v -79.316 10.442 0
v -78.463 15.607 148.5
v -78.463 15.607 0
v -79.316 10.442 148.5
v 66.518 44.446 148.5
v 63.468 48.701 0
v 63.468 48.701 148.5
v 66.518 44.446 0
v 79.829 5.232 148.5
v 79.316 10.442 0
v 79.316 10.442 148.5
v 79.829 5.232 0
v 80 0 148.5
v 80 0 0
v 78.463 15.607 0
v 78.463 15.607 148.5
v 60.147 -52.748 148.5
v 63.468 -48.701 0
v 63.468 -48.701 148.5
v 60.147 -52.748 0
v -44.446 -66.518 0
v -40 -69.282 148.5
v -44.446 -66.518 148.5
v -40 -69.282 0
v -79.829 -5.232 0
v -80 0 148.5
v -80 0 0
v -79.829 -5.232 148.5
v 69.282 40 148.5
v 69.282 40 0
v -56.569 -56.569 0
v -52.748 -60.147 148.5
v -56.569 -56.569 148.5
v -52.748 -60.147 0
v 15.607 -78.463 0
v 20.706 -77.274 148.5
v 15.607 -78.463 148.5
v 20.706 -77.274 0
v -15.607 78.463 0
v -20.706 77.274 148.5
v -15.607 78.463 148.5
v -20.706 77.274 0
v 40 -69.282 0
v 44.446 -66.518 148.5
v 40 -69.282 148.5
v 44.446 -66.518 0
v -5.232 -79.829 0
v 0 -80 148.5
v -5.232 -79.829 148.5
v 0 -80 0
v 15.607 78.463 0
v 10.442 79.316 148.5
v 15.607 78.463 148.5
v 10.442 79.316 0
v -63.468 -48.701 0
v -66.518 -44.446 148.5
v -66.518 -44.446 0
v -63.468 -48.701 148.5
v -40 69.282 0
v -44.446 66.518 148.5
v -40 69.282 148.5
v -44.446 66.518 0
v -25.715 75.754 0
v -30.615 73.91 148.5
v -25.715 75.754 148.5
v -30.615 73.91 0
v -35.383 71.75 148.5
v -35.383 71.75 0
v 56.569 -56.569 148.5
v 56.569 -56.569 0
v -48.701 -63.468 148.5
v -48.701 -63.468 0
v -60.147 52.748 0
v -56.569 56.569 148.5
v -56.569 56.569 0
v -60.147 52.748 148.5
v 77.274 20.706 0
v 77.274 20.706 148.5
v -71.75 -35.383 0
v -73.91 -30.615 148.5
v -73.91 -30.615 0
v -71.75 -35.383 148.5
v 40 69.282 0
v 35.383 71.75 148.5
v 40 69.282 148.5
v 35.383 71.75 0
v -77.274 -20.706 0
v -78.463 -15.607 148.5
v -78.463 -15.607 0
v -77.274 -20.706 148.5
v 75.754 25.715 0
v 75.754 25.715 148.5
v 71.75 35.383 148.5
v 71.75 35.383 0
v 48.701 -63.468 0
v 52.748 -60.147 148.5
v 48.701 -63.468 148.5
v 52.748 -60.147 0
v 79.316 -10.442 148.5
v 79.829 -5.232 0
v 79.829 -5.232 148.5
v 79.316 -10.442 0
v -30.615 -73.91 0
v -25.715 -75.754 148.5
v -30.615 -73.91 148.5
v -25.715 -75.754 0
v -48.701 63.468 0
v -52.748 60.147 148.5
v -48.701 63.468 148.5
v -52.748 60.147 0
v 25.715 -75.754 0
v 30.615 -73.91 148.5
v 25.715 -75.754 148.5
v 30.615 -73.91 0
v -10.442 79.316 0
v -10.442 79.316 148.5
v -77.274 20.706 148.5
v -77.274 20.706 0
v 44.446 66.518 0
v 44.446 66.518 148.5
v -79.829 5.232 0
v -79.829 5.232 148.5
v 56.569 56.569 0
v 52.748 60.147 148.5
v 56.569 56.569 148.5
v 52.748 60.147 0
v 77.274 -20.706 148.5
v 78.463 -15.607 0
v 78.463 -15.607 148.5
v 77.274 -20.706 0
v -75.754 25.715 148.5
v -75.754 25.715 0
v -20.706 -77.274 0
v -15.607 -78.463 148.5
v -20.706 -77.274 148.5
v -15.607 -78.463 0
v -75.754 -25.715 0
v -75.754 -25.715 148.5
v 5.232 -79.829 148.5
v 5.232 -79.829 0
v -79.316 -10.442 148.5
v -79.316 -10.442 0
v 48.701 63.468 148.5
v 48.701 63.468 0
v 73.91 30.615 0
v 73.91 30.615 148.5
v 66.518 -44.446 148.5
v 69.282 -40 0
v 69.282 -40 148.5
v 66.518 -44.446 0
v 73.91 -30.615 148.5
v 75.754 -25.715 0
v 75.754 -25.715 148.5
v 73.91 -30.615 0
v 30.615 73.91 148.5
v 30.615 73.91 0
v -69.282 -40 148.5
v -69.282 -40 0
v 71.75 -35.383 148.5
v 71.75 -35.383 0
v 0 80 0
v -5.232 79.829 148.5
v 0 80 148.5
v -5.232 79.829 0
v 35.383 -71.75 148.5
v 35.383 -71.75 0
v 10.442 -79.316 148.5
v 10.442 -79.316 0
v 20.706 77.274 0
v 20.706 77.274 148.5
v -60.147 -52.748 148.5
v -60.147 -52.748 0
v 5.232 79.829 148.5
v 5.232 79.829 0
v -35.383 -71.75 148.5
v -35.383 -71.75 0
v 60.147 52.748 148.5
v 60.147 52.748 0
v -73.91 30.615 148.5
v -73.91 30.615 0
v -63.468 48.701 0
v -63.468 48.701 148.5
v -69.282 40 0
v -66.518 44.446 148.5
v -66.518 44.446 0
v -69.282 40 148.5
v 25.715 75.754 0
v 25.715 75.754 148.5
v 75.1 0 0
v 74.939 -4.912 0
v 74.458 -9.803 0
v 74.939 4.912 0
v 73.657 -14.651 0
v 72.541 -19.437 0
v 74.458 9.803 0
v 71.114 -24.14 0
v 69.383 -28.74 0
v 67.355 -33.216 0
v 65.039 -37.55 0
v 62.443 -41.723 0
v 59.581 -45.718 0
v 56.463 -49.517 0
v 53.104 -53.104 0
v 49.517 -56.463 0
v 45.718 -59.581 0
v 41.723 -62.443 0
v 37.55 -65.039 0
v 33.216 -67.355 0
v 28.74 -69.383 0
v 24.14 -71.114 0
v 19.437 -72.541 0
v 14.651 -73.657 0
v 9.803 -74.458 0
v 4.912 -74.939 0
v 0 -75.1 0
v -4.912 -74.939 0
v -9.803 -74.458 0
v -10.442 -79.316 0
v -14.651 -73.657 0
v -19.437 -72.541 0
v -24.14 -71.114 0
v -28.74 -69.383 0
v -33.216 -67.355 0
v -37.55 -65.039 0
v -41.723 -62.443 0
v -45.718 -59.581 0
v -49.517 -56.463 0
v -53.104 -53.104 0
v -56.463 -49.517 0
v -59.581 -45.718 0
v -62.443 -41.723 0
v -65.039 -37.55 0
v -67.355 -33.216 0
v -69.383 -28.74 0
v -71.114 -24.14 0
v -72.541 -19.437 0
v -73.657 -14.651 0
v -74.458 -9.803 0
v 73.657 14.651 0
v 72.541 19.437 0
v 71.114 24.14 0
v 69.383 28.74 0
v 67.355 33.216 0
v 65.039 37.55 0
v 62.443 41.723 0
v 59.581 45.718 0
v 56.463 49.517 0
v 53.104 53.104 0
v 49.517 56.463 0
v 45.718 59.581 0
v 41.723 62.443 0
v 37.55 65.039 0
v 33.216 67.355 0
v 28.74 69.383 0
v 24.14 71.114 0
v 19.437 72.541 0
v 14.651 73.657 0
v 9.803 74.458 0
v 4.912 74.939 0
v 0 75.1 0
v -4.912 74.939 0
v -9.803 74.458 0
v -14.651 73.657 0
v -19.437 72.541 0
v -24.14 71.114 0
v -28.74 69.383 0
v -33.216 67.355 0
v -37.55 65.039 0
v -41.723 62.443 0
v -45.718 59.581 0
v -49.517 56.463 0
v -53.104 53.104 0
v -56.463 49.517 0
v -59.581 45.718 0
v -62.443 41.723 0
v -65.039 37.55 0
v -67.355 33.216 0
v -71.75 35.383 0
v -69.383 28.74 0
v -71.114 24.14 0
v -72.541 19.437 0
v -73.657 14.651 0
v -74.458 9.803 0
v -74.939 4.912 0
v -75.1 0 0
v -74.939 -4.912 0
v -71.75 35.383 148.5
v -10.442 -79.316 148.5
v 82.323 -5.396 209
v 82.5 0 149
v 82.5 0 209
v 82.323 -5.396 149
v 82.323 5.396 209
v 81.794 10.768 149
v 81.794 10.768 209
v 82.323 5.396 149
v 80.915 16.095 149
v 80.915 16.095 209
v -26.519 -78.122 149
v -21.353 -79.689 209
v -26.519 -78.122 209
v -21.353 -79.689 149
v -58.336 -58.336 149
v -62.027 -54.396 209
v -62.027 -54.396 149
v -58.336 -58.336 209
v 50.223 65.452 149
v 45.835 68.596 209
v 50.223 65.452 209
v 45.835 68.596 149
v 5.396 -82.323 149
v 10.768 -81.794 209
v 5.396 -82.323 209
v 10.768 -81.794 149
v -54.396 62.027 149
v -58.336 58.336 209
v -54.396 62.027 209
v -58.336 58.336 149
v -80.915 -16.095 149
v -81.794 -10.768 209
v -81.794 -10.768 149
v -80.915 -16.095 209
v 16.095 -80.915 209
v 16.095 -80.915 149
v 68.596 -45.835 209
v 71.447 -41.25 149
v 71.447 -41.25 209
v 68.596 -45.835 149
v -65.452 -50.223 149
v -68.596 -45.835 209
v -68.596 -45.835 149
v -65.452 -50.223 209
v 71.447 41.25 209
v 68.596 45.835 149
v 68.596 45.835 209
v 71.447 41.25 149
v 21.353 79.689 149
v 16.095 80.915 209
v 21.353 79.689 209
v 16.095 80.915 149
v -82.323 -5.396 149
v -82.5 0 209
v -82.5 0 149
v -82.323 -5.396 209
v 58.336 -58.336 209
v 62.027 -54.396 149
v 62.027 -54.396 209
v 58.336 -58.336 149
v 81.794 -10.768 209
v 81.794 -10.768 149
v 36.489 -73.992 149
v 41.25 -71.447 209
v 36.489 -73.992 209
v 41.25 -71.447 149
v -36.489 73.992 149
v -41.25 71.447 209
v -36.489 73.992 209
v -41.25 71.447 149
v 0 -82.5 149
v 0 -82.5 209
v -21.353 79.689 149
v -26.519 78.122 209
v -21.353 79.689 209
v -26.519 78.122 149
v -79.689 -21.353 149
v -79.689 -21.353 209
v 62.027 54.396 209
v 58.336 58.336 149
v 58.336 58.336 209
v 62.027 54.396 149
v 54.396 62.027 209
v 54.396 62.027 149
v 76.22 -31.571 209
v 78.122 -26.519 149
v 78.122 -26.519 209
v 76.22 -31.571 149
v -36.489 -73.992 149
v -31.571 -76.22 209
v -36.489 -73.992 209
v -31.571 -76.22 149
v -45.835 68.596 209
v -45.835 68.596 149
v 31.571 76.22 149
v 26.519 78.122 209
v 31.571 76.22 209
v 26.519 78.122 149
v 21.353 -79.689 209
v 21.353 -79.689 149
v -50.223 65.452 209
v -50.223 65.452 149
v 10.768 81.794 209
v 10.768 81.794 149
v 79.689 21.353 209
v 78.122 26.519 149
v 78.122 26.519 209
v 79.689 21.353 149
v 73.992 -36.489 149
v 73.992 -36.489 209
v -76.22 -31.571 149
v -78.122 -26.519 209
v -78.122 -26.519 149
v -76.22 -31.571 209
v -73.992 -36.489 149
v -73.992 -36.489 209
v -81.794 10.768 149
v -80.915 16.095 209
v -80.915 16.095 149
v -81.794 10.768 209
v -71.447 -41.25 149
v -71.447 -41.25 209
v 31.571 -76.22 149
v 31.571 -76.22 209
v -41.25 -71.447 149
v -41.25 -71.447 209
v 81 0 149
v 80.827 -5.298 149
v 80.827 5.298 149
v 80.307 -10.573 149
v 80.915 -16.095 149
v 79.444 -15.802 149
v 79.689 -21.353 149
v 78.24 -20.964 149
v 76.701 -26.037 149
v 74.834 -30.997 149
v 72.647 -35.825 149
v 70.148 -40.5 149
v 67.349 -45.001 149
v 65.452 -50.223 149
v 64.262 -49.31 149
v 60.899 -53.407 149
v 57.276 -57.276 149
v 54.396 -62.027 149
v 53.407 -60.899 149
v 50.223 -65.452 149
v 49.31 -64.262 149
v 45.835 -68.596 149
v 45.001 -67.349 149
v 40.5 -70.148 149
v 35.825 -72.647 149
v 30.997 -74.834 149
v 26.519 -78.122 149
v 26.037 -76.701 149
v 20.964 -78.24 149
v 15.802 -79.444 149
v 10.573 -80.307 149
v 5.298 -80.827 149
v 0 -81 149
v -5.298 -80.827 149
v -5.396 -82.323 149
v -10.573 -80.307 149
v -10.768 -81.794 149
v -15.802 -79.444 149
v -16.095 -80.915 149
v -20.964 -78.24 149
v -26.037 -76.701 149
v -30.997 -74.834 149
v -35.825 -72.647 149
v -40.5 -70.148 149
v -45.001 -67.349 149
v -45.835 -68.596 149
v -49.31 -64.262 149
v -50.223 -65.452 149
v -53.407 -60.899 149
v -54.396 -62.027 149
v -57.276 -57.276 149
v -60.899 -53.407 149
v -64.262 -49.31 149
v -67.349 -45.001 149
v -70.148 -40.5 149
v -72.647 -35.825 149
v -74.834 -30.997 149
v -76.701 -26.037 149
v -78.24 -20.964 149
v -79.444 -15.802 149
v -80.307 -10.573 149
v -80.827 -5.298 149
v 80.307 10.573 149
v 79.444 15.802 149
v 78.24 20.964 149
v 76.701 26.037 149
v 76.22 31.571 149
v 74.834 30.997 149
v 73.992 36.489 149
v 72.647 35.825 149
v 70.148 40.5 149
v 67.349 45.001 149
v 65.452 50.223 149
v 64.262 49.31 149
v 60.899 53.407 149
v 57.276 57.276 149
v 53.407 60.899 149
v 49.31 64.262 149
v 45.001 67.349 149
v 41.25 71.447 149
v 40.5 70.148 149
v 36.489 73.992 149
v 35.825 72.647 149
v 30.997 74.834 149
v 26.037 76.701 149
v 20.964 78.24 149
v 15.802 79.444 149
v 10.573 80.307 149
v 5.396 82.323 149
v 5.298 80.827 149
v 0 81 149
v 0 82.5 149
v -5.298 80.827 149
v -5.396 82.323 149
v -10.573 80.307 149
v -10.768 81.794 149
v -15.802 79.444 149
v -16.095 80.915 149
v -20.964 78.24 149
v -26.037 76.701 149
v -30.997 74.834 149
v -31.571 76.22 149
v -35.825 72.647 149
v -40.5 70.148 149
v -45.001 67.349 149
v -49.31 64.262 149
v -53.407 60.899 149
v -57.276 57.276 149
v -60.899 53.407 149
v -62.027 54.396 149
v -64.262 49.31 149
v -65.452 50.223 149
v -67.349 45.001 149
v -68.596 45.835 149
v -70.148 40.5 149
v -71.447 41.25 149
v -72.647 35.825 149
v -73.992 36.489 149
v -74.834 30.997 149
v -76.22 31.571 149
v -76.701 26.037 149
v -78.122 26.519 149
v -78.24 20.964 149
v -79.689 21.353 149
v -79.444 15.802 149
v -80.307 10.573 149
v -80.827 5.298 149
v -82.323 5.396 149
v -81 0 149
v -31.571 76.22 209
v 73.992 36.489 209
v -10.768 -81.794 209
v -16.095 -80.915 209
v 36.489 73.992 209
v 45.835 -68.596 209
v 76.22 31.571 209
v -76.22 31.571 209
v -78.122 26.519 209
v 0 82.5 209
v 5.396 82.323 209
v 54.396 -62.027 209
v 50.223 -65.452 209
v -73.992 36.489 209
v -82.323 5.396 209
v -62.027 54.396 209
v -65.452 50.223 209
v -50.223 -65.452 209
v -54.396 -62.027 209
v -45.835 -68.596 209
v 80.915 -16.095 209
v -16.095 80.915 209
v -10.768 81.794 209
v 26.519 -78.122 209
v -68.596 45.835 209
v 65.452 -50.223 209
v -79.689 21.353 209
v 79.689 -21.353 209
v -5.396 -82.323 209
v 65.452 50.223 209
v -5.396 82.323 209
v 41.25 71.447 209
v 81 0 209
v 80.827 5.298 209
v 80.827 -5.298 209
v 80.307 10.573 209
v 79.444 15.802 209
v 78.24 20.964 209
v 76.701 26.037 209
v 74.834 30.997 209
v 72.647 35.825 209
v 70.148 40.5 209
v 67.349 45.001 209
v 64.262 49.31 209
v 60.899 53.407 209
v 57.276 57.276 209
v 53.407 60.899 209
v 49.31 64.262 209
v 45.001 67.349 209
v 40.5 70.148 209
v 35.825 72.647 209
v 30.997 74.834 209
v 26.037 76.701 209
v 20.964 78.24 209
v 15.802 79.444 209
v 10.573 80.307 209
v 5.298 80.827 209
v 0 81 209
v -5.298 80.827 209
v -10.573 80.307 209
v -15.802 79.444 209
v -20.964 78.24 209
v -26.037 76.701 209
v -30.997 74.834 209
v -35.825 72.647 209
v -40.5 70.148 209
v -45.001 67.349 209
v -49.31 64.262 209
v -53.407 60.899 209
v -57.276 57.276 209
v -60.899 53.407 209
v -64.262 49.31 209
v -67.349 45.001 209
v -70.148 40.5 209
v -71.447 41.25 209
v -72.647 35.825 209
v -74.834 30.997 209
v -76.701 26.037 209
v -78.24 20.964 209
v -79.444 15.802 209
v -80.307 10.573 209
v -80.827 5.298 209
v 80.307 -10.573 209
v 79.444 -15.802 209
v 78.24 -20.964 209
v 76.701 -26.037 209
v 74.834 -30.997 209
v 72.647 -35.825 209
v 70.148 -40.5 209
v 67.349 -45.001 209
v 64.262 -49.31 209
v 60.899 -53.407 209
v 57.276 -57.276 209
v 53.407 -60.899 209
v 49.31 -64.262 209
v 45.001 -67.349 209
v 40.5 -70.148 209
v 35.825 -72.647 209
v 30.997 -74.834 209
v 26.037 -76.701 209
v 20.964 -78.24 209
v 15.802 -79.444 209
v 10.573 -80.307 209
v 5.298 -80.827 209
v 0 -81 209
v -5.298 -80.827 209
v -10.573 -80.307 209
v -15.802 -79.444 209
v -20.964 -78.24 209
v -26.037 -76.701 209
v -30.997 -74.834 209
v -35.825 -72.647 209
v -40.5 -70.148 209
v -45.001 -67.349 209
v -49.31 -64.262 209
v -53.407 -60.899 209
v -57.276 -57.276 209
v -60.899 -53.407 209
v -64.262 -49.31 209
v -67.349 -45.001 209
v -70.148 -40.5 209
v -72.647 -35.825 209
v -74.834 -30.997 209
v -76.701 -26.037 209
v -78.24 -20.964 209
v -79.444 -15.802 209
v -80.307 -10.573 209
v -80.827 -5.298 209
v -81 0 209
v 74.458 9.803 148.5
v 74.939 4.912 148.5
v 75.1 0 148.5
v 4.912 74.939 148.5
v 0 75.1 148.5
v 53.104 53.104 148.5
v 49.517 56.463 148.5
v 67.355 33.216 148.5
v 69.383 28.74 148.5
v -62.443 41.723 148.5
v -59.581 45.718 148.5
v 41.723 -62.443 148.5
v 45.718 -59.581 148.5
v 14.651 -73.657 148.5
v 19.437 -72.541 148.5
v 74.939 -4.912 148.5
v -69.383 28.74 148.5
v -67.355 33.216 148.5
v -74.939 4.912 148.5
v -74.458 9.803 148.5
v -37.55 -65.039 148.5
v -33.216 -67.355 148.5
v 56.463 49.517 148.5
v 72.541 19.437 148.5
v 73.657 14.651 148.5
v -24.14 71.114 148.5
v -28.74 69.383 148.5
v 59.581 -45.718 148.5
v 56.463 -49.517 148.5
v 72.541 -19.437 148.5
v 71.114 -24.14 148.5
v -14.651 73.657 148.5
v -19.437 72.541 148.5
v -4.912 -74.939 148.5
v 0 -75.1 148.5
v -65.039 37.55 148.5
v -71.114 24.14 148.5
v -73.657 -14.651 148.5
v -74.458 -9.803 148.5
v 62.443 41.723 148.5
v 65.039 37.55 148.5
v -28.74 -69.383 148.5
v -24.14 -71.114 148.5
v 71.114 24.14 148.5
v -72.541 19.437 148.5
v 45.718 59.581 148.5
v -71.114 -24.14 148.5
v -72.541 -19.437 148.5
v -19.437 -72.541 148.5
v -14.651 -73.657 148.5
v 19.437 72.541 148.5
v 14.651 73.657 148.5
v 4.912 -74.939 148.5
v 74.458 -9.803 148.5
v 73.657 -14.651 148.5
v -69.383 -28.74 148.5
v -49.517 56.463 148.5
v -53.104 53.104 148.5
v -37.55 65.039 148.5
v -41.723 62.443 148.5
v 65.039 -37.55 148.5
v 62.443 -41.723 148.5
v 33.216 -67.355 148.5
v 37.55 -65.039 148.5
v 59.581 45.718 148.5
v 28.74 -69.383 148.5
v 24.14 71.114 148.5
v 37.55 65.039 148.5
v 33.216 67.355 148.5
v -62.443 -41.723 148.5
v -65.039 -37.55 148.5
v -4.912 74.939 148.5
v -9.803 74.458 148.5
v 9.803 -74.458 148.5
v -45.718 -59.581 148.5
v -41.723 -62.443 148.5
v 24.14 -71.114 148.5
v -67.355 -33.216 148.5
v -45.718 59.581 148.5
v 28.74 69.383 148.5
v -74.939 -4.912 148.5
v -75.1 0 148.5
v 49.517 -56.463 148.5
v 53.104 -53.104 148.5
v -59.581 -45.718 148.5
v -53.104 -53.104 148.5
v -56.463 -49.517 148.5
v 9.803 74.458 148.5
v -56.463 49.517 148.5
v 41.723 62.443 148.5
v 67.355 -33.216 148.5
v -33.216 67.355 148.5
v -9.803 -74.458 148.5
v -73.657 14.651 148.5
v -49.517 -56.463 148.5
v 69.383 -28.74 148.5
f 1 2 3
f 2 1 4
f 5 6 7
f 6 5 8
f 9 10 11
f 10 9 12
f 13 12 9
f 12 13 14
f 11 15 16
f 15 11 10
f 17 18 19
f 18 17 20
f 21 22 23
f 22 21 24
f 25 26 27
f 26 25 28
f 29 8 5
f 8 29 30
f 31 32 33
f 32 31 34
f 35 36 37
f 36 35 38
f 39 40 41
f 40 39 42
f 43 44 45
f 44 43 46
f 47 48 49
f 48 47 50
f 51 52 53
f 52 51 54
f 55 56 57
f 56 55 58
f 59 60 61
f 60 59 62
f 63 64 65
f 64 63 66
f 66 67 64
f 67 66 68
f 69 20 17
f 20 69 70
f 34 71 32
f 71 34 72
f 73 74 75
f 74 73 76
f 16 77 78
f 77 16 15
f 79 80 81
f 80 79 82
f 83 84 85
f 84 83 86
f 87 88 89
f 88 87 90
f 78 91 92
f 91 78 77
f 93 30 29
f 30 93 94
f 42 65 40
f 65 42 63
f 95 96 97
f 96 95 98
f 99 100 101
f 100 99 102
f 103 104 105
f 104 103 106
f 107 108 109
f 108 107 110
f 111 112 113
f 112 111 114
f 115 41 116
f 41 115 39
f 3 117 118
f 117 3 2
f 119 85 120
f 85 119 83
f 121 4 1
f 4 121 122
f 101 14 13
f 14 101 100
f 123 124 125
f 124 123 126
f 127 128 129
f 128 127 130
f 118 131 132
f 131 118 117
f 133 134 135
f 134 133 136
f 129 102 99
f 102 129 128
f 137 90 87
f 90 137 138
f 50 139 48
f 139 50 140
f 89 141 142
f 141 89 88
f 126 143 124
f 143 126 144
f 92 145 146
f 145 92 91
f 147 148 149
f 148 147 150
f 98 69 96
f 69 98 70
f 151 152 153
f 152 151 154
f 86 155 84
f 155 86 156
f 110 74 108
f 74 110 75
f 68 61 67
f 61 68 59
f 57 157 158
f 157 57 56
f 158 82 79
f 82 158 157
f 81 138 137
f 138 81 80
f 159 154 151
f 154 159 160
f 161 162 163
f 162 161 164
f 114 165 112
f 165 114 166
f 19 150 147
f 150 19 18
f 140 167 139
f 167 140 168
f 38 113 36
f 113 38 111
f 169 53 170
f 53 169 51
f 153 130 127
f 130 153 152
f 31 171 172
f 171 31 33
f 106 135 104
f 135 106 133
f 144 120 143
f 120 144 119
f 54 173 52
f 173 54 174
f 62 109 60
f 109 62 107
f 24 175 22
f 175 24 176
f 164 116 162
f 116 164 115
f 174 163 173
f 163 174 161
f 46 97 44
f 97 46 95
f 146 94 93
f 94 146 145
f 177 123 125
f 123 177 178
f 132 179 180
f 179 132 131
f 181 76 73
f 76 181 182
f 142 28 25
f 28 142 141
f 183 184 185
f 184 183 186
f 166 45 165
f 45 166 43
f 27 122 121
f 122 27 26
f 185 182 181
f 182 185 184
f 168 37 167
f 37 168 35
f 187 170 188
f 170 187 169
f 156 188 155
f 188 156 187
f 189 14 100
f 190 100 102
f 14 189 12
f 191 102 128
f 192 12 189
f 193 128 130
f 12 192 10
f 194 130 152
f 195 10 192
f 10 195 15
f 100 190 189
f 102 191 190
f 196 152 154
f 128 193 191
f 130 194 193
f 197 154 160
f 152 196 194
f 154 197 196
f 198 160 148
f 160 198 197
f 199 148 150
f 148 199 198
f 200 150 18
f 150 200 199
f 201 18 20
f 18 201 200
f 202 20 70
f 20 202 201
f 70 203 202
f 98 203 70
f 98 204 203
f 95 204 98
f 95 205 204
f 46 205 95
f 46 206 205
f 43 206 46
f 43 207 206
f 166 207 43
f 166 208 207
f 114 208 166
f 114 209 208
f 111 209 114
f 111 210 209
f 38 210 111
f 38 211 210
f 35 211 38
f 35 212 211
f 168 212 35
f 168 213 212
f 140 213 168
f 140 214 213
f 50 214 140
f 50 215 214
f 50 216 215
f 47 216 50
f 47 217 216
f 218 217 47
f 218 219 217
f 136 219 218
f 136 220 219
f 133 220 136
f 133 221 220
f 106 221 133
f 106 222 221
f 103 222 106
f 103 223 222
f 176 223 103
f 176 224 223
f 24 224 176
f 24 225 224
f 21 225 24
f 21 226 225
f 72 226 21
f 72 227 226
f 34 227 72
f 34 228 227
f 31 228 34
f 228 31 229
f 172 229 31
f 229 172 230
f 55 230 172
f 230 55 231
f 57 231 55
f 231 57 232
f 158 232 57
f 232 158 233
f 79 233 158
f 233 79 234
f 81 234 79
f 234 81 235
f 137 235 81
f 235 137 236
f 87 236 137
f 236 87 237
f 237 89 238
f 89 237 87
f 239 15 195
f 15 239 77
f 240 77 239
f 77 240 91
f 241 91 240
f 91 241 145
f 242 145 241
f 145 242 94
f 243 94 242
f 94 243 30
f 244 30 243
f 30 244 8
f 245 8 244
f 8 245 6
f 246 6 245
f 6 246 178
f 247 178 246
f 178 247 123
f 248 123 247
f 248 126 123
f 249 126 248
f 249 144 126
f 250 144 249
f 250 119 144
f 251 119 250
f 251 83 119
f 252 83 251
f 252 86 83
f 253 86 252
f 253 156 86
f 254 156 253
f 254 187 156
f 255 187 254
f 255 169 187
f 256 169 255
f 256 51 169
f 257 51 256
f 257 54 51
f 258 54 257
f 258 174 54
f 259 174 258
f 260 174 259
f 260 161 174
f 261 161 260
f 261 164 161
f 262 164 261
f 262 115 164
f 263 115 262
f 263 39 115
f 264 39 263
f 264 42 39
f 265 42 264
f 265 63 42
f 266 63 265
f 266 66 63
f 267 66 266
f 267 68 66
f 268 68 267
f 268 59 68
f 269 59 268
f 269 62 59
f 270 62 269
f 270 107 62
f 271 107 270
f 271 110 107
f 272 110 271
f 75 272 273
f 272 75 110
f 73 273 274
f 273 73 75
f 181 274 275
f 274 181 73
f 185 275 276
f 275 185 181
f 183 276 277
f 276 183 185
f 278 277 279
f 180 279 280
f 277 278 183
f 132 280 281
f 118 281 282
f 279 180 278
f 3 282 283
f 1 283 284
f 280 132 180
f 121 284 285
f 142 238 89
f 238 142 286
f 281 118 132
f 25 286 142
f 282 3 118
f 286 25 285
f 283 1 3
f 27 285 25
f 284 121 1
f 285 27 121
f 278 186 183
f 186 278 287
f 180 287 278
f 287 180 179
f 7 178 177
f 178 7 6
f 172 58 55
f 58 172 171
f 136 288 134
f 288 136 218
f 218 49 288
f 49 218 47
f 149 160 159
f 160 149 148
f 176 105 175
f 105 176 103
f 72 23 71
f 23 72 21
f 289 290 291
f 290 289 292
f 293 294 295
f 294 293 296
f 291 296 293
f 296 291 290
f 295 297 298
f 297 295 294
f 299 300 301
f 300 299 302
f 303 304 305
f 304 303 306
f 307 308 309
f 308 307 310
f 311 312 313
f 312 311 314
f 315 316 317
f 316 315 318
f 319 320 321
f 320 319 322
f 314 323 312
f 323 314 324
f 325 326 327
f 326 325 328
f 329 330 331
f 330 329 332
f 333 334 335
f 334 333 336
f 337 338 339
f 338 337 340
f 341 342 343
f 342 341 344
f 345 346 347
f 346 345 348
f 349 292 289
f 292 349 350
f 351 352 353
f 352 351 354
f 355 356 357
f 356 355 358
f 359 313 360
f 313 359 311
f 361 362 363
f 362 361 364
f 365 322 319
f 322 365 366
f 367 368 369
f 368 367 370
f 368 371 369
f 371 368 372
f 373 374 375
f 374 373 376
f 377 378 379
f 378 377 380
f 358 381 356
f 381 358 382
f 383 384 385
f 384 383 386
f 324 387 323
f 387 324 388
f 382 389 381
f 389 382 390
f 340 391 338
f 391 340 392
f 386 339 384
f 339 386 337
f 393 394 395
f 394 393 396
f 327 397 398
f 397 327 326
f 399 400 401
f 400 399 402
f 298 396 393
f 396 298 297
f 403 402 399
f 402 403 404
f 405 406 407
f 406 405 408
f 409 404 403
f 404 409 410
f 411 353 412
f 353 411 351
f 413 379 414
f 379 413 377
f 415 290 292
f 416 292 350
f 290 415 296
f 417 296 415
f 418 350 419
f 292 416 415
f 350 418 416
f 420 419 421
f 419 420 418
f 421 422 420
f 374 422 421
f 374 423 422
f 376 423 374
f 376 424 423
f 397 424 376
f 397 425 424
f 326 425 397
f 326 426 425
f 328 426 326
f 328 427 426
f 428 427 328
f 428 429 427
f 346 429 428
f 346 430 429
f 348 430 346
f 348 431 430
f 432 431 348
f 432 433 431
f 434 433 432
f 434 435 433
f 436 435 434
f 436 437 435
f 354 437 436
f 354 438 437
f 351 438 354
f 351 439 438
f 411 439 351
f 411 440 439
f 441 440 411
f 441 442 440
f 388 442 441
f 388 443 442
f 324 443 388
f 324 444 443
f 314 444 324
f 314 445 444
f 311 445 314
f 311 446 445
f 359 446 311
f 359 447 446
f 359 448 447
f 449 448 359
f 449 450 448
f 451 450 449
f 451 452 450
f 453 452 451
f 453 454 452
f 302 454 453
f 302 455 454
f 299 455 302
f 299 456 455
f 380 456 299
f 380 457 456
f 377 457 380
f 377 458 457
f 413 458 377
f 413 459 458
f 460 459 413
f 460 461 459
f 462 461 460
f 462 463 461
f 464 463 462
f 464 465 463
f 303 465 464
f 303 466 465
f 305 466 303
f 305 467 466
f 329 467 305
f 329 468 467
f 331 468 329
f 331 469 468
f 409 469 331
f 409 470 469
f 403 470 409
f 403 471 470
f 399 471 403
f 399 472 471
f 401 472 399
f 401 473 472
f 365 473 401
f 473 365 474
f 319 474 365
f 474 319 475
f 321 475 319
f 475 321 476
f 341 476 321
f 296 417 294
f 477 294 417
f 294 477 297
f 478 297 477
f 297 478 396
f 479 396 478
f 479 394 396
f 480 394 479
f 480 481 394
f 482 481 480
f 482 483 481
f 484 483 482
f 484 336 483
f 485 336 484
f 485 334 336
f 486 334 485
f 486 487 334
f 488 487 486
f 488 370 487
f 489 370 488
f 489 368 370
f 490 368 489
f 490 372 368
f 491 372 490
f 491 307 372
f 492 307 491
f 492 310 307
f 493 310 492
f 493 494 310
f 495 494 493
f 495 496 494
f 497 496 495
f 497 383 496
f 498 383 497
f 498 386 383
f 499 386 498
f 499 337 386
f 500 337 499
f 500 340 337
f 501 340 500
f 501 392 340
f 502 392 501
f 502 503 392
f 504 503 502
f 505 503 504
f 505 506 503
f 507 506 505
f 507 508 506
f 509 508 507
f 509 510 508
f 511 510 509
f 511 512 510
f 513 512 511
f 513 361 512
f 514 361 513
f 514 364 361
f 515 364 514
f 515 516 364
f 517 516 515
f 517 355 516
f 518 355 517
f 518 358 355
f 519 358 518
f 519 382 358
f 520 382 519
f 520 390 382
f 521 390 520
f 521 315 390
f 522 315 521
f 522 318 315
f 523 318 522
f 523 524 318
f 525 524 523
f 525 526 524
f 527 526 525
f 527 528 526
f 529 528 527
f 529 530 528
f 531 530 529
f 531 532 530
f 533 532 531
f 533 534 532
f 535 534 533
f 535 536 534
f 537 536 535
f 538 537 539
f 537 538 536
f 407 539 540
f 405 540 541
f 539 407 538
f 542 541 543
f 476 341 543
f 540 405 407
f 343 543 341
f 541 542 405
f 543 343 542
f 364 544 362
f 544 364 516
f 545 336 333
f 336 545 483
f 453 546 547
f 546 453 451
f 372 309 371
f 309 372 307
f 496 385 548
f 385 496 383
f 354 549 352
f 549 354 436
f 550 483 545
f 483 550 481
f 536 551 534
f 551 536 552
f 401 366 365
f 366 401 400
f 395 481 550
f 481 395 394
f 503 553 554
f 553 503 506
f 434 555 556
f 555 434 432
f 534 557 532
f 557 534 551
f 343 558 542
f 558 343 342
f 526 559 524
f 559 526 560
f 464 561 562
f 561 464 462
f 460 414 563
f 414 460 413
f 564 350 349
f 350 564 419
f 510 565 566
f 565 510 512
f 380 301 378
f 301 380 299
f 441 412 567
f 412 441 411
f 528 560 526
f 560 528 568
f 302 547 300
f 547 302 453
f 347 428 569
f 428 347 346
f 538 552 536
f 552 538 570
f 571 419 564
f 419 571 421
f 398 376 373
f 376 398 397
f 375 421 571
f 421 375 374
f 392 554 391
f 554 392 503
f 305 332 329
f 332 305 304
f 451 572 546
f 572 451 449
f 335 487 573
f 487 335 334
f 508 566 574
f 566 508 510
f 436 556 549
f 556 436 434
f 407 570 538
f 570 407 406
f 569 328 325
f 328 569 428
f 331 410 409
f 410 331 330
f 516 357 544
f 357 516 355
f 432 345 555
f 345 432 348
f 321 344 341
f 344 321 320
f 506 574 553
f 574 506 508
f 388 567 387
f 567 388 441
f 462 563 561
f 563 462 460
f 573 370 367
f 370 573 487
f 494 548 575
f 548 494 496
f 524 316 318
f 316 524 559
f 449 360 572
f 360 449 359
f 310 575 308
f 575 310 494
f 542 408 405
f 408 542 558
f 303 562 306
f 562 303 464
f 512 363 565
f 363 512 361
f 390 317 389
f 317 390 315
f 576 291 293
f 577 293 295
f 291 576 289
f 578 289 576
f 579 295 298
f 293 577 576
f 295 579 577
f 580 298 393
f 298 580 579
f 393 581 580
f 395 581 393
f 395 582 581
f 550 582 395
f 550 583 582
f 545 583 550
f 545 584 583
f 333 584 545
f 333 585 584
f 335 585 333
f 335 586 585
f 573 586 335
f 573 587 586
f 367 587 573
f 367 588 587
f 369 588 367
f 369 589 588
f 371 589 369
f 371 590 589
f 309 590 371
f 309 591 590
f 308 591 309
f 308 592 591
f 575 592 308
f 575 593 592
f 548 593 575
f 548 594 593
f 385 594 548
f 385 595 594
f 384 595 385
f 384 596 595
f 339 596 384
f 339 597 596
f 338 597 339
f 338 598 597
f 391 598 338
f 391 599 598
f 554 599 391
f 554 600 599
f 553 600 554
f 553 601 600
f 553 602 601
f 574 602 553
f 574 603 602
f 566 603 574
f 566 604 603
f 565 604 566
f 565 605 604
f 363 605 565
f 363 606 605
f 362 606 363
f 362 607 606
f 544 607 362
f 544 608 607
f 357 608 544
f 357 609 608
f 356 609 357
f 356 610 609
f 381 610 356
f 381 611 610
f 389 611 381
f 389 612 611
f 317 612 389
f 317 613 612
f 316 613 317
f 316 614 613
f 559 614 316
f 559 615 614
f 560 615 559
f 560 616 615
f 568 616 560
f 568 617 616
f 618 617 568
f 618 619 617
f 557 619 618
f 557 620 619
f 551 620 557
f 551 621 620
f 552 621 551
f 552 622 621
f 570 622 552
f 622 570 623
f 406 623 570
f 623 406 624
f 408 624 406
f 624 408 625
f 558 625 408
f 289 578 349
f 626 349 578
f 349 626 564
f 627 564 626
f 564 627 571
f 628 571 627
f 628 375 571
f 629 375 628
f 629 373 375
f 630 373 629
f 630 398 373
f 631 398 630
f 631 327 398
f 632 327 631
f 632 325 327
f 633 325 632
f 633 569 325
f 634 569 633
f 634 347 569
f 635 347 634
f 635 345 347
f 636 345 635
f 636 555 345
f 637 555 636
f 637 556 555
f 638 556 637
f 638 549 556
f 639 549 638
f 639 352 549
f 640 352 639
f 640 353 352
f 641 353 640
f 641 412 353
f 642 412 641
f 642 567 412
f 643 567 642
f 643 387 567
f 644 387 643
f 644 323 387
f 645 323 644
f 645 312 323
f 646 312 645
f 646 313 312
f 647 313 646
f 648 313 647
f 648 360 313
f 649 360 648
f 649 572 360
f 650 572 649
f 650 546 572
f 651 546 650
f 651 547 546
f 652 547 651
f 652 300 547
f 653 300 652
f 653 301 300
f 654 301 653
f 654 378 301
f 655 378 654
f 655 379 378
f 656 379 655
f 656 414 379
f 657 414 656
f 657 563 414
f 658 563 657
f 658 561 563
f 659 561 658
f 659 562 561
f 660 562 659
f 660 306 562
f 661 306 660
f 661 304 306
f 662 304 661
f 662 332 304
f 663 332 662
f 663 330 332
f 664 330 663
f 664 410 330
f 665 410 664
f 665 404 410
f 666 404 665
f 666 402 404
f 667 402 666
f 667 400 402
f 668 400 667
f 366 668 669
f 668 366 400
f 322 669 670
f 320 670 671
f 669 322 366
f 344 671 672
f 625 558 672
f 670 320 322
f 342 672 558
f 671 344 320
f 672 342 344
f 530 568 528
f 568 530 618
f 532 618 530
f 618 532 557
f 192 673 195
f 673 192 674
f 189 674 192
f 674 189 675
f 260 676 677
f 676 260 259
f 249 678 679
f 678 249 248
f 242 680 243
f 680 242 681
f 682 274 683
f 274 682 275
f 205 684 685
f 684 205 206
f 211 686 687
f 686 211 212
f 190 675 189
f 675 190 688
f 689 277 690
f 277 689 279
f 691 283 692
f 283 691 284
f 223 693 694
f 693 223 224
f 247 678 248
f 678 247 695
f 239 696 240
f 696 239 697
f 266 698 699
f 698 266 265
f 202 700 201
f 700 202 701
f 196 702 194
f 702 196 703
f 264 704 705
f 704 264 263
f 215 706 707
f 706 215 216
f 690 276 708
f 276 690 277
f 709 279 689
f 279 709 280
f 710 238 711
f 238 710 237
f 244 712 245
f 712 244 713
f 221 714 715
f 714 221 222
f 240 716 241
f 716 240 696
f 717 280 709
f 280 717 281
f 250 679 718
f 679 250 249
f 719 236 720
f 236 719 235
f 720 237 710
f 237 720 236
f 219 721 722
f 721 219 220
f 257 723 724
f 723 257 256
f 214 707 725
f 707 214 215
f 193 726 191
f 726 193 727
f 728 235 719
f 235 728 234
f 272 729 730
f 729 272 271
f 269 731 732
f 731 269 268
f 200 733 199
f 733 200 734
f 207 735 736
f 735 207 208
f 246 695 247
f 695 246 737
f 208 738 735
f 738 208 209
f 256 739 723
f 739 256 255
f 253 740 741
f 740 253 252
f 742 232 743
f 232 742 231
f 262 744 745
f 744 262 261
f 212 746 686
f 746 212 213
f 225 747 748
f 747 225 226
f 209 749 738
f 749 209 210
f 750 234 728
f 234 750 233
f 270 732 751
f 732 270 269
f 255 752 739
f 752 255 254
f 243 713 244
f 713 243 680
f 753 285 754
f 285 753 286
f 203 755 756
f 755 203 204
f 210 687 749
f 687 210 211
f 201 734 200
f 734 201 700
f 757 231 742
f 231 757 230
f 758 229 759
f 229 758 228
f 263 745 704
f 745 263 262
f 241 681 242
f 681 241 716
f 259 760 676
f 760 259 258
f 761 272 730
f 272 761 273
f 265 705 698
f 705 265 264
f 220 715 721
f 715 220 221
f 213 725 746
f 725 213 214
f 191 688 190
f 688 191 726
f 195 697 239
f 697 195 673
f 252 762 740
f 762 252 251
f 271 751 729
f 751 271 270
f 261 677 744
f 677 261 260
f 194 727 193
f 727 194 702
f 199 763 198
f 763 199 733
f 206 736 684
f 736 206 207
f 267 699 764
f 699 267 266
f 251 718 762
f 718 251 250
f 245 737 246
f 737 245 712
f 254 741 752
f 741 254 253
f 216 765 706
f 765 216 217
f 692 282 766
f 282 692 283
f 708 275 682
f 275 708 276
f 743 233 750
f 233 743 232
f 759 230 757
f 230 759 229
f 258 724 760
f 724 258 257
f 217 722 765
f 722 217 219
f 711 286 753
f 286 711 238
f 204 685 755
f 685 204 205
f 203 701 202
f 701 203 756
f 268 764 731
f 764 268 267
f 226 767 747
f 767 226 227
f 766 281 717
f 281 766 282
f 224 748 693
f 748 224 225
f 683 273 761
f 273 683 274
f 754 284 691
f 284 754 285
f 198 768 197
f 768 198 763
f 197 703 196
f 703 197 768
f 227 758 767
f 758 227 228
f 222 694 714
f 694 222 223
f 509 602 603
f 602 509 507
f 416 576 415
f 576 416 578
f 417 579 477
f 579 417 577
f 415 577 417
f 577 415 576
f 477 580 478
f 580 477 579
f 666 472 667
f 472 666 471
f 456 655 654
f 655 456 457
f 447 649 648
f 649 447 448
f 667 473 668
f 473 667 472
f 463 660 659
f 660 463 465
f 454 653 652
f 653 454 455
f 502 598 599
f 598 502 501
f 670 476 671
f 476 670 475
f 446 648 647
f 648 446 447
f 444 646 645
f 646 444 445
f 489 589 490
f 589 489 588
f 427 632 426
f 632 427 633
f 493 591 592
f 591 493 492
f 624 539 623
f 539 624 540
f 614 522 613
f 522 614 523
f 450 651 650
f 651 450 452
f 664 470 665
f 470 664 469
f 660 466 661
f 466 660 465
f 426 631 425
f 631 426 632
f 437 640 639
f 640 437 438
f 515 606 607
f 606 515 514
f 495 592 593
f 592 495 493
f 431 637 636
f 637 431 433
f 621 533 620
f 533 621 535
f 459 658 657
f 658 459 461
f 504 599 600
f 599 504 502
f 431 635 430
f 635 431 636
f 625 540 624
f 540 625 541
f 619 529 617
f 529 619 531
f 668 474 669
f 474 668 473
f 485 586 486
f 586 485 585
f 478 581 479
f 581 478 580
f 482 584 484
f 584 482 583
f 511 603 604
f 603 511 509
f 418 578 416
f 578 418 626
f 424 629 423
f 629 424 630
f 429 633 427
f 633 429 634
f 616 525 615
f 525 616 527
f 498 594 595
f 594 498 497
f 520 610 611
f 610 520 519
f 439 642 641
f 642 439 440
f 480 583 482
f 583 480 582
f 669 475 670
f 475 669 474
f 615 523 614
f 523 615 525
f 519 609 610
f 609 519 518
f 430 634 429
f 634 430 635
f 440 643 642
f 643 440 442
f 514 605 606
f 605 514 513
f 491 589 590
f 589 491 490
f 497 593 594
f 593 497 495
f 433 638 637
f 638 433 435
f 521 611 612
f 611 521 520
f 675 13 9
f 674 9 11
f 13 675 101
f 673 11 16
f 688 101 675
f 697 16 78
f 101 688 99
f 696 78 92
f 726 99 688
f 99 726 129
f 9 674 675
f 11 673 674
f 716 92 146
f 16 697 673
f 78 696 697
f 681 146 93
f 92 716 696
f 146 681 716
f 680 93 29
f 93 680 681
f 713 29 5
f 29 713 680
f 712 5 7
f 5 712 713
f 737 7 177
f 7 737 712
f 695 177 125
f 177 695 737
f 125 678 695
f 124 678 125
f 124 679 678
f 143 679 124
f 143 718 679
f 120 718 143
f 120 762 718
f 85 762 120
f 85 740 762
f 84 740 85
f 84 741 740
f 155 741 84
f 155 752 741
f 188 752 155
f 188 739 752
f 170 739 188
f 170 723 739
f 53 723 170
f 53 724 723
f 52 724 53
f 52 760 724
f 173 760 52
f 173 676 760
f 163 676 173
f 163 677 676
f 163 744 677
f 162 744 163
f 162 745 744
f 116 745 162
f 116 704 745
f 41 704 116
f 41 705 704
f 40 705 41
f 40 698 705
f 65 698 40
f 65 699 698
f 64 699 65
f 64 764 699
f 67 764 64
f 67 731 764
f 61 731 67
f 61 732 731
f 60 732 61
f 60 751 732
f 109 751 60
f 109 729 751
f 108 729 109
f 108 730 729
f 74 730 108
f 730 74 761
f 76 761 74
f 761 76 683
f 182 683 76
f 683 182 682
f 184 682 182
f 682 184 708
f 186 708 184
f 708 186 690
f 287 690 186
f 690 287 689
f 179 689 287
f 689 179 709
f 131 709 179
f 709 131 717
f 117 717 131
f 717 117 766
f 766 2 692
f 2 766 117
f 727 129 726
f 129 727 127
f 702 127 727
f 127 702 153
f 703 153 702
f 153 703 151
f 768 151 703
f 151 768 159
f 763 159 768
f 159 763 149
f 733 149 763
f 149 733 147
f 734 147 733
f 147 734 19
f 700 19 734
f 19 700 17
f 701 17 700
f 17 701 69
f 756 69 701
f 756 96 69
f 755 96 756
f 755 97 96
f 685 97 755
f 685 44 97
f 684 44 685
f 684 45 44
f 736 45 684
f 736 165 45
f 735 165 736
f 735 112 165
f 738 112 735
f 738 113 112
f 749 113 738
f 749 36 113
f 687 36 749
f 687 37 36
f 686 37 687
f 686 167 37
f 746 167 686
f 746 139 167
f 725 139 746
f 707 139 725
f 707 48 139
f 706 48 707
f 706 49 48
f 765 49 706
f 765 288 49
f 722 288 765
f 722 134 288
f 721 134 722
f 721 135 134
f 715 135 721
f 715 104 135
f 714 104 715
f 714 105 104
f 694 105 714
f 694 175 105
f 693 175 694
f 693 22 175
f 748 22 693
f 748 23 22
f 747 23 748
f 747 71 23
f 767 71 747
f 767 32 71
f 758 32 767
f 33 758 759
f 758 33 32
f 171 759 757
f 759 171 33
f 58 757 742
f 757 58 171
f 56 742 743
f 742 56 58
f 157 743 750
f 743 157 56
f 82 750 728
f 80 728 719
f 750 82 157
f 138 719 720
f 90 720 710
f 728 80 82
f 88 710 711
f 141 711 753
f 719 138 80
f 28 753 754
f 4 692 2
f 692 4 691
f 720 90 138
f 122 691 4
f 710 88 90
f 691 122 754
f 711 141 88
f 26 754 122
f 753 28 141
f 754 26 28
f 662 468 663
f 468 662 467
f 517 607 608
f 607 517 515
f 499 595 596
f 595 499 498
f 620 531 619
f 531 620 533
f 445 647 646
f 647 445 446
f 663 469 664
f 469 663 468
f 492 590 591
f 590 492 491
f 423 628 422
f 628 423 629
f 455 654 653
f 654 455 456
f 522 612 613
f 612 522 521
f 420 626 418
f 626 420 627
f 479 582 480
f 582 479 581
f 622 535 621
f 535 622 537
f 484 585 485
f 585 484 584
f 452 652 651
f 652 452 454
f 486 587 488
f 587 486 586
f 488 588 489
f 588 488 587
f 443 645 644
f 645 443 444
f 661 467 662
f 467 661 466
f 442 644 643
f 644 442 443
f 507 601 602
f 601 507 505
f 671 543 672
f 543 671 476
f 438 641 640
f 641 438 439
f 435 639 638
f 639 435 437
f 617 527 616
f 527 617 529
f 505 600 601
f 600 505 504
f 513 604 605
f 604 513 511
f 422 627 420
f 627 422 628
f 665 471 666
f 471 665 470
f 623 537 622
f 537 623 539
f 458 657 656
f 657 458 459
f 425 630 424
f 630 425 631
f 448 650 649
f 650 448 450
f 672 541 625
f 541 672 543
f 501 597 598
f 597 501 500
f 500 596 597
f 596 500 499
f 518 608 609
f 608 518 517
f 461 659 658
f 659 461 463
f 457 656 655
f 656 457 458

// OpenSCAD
// HT 160 pipe, length 150 mm (with one socket end)
// One connected solid; all placements are formula-based.

length_mm = 150;                 //[75:300:1]
ht160_outer_diameter = 160;      //[120:240:1]
ht160_wall_thickness = 4.9;      //[2.5:10:0.1]

socket_length = 60;              //[30:120:1]
socket_wall_extra = 2.5;         //[1:6:0.1]
socket_clearance = 1.0;          //[0.2:2.5:0.1]

socket_stop_thickness = 3.0;     //[1:8:0.1]
socket_stop_length = 8;          //[3:20:1]

overlap_mm = 1.0;                //[0.5:2.0:0.1]
fn = 96;                         //[24:192:1]

module ht_pipe() {
    od = ht160_outer_diameter;
    wt = ht160_wall_thickness;

    // Radii
    r_outer = od/2;
    r_inner = r_outer - wt;

    // Socket radii
    r_socket_outer = r_outer + socket_wall_extra;
    r_socket_inner = r_outer + socket_clearance;

    // Stop ring inner radius (smaller bore near socket base)
    r_stop_inner = r_socket_inner - socket_stop_thickness;

    // Safety clamps to avoid invalid/empty geometry
    eps = 0.01;
    r_inner_ok = max(eps, r_inner);
    r_stop_inner_ok = max(eps, r_stop_inner);

    // Z positions (pipe runs from z=0 to z=length_mm)
    z_pipe0 = 0;
    z_pipe1 = length_mm;

    // Socket overlaps the pipe to guarantee connectivity
    z_sock0 = z_pipe1 - overlap_mm;
    z_sock1 = z_sock0 + socket_length;

    // Stop ring occupies first part of socket (near pipe end)
    z_stop0 = z_sock0;
    z_stop1 = z_sock0 + socket_stop_length;

    color([0.85, 0.85, 0.8])
    difference() {
        // OUTER SOLID (connected)
        union() {
            // Main outer cylinder
            translate([0, 0, z_pipe0])
                cylinder(h=length_mm, r=r_outer, $fn=fn);

            // Socket outer cylinder (overlaps into main pipe)
            translate([0, 0, z_sock0])
                cylinder(h=socket_length, r=r_socket_outer, $fn=fn);
        }

        // INNER VOID (single connected subtraction)
        union() {
            // Main pipe bore
            translate([0, 0, z_pipe0 - overlap_mm/2])
                cylinder(h=length_mm + overlap_mm, r=r_inner_ok, $fn=fn);

            // Socket bore (larger) for full socket length
            translate([0, 0, z_sock0 - overlap_mm/2])
                cylinder(h=socket_length + overlap_mm, r=r_socket_inner, $fn=fn);

            // Stop region: subtract smaller bore near base so material remains as a shoulder
            translate([0, 0, z_stop0 - overlap_mm/2])
                cylinder(h=socket_stop_length + overlap_mm, r=r_stop_inner_ok, $fn=fn);
        }
    }
}

ht_pipe();
